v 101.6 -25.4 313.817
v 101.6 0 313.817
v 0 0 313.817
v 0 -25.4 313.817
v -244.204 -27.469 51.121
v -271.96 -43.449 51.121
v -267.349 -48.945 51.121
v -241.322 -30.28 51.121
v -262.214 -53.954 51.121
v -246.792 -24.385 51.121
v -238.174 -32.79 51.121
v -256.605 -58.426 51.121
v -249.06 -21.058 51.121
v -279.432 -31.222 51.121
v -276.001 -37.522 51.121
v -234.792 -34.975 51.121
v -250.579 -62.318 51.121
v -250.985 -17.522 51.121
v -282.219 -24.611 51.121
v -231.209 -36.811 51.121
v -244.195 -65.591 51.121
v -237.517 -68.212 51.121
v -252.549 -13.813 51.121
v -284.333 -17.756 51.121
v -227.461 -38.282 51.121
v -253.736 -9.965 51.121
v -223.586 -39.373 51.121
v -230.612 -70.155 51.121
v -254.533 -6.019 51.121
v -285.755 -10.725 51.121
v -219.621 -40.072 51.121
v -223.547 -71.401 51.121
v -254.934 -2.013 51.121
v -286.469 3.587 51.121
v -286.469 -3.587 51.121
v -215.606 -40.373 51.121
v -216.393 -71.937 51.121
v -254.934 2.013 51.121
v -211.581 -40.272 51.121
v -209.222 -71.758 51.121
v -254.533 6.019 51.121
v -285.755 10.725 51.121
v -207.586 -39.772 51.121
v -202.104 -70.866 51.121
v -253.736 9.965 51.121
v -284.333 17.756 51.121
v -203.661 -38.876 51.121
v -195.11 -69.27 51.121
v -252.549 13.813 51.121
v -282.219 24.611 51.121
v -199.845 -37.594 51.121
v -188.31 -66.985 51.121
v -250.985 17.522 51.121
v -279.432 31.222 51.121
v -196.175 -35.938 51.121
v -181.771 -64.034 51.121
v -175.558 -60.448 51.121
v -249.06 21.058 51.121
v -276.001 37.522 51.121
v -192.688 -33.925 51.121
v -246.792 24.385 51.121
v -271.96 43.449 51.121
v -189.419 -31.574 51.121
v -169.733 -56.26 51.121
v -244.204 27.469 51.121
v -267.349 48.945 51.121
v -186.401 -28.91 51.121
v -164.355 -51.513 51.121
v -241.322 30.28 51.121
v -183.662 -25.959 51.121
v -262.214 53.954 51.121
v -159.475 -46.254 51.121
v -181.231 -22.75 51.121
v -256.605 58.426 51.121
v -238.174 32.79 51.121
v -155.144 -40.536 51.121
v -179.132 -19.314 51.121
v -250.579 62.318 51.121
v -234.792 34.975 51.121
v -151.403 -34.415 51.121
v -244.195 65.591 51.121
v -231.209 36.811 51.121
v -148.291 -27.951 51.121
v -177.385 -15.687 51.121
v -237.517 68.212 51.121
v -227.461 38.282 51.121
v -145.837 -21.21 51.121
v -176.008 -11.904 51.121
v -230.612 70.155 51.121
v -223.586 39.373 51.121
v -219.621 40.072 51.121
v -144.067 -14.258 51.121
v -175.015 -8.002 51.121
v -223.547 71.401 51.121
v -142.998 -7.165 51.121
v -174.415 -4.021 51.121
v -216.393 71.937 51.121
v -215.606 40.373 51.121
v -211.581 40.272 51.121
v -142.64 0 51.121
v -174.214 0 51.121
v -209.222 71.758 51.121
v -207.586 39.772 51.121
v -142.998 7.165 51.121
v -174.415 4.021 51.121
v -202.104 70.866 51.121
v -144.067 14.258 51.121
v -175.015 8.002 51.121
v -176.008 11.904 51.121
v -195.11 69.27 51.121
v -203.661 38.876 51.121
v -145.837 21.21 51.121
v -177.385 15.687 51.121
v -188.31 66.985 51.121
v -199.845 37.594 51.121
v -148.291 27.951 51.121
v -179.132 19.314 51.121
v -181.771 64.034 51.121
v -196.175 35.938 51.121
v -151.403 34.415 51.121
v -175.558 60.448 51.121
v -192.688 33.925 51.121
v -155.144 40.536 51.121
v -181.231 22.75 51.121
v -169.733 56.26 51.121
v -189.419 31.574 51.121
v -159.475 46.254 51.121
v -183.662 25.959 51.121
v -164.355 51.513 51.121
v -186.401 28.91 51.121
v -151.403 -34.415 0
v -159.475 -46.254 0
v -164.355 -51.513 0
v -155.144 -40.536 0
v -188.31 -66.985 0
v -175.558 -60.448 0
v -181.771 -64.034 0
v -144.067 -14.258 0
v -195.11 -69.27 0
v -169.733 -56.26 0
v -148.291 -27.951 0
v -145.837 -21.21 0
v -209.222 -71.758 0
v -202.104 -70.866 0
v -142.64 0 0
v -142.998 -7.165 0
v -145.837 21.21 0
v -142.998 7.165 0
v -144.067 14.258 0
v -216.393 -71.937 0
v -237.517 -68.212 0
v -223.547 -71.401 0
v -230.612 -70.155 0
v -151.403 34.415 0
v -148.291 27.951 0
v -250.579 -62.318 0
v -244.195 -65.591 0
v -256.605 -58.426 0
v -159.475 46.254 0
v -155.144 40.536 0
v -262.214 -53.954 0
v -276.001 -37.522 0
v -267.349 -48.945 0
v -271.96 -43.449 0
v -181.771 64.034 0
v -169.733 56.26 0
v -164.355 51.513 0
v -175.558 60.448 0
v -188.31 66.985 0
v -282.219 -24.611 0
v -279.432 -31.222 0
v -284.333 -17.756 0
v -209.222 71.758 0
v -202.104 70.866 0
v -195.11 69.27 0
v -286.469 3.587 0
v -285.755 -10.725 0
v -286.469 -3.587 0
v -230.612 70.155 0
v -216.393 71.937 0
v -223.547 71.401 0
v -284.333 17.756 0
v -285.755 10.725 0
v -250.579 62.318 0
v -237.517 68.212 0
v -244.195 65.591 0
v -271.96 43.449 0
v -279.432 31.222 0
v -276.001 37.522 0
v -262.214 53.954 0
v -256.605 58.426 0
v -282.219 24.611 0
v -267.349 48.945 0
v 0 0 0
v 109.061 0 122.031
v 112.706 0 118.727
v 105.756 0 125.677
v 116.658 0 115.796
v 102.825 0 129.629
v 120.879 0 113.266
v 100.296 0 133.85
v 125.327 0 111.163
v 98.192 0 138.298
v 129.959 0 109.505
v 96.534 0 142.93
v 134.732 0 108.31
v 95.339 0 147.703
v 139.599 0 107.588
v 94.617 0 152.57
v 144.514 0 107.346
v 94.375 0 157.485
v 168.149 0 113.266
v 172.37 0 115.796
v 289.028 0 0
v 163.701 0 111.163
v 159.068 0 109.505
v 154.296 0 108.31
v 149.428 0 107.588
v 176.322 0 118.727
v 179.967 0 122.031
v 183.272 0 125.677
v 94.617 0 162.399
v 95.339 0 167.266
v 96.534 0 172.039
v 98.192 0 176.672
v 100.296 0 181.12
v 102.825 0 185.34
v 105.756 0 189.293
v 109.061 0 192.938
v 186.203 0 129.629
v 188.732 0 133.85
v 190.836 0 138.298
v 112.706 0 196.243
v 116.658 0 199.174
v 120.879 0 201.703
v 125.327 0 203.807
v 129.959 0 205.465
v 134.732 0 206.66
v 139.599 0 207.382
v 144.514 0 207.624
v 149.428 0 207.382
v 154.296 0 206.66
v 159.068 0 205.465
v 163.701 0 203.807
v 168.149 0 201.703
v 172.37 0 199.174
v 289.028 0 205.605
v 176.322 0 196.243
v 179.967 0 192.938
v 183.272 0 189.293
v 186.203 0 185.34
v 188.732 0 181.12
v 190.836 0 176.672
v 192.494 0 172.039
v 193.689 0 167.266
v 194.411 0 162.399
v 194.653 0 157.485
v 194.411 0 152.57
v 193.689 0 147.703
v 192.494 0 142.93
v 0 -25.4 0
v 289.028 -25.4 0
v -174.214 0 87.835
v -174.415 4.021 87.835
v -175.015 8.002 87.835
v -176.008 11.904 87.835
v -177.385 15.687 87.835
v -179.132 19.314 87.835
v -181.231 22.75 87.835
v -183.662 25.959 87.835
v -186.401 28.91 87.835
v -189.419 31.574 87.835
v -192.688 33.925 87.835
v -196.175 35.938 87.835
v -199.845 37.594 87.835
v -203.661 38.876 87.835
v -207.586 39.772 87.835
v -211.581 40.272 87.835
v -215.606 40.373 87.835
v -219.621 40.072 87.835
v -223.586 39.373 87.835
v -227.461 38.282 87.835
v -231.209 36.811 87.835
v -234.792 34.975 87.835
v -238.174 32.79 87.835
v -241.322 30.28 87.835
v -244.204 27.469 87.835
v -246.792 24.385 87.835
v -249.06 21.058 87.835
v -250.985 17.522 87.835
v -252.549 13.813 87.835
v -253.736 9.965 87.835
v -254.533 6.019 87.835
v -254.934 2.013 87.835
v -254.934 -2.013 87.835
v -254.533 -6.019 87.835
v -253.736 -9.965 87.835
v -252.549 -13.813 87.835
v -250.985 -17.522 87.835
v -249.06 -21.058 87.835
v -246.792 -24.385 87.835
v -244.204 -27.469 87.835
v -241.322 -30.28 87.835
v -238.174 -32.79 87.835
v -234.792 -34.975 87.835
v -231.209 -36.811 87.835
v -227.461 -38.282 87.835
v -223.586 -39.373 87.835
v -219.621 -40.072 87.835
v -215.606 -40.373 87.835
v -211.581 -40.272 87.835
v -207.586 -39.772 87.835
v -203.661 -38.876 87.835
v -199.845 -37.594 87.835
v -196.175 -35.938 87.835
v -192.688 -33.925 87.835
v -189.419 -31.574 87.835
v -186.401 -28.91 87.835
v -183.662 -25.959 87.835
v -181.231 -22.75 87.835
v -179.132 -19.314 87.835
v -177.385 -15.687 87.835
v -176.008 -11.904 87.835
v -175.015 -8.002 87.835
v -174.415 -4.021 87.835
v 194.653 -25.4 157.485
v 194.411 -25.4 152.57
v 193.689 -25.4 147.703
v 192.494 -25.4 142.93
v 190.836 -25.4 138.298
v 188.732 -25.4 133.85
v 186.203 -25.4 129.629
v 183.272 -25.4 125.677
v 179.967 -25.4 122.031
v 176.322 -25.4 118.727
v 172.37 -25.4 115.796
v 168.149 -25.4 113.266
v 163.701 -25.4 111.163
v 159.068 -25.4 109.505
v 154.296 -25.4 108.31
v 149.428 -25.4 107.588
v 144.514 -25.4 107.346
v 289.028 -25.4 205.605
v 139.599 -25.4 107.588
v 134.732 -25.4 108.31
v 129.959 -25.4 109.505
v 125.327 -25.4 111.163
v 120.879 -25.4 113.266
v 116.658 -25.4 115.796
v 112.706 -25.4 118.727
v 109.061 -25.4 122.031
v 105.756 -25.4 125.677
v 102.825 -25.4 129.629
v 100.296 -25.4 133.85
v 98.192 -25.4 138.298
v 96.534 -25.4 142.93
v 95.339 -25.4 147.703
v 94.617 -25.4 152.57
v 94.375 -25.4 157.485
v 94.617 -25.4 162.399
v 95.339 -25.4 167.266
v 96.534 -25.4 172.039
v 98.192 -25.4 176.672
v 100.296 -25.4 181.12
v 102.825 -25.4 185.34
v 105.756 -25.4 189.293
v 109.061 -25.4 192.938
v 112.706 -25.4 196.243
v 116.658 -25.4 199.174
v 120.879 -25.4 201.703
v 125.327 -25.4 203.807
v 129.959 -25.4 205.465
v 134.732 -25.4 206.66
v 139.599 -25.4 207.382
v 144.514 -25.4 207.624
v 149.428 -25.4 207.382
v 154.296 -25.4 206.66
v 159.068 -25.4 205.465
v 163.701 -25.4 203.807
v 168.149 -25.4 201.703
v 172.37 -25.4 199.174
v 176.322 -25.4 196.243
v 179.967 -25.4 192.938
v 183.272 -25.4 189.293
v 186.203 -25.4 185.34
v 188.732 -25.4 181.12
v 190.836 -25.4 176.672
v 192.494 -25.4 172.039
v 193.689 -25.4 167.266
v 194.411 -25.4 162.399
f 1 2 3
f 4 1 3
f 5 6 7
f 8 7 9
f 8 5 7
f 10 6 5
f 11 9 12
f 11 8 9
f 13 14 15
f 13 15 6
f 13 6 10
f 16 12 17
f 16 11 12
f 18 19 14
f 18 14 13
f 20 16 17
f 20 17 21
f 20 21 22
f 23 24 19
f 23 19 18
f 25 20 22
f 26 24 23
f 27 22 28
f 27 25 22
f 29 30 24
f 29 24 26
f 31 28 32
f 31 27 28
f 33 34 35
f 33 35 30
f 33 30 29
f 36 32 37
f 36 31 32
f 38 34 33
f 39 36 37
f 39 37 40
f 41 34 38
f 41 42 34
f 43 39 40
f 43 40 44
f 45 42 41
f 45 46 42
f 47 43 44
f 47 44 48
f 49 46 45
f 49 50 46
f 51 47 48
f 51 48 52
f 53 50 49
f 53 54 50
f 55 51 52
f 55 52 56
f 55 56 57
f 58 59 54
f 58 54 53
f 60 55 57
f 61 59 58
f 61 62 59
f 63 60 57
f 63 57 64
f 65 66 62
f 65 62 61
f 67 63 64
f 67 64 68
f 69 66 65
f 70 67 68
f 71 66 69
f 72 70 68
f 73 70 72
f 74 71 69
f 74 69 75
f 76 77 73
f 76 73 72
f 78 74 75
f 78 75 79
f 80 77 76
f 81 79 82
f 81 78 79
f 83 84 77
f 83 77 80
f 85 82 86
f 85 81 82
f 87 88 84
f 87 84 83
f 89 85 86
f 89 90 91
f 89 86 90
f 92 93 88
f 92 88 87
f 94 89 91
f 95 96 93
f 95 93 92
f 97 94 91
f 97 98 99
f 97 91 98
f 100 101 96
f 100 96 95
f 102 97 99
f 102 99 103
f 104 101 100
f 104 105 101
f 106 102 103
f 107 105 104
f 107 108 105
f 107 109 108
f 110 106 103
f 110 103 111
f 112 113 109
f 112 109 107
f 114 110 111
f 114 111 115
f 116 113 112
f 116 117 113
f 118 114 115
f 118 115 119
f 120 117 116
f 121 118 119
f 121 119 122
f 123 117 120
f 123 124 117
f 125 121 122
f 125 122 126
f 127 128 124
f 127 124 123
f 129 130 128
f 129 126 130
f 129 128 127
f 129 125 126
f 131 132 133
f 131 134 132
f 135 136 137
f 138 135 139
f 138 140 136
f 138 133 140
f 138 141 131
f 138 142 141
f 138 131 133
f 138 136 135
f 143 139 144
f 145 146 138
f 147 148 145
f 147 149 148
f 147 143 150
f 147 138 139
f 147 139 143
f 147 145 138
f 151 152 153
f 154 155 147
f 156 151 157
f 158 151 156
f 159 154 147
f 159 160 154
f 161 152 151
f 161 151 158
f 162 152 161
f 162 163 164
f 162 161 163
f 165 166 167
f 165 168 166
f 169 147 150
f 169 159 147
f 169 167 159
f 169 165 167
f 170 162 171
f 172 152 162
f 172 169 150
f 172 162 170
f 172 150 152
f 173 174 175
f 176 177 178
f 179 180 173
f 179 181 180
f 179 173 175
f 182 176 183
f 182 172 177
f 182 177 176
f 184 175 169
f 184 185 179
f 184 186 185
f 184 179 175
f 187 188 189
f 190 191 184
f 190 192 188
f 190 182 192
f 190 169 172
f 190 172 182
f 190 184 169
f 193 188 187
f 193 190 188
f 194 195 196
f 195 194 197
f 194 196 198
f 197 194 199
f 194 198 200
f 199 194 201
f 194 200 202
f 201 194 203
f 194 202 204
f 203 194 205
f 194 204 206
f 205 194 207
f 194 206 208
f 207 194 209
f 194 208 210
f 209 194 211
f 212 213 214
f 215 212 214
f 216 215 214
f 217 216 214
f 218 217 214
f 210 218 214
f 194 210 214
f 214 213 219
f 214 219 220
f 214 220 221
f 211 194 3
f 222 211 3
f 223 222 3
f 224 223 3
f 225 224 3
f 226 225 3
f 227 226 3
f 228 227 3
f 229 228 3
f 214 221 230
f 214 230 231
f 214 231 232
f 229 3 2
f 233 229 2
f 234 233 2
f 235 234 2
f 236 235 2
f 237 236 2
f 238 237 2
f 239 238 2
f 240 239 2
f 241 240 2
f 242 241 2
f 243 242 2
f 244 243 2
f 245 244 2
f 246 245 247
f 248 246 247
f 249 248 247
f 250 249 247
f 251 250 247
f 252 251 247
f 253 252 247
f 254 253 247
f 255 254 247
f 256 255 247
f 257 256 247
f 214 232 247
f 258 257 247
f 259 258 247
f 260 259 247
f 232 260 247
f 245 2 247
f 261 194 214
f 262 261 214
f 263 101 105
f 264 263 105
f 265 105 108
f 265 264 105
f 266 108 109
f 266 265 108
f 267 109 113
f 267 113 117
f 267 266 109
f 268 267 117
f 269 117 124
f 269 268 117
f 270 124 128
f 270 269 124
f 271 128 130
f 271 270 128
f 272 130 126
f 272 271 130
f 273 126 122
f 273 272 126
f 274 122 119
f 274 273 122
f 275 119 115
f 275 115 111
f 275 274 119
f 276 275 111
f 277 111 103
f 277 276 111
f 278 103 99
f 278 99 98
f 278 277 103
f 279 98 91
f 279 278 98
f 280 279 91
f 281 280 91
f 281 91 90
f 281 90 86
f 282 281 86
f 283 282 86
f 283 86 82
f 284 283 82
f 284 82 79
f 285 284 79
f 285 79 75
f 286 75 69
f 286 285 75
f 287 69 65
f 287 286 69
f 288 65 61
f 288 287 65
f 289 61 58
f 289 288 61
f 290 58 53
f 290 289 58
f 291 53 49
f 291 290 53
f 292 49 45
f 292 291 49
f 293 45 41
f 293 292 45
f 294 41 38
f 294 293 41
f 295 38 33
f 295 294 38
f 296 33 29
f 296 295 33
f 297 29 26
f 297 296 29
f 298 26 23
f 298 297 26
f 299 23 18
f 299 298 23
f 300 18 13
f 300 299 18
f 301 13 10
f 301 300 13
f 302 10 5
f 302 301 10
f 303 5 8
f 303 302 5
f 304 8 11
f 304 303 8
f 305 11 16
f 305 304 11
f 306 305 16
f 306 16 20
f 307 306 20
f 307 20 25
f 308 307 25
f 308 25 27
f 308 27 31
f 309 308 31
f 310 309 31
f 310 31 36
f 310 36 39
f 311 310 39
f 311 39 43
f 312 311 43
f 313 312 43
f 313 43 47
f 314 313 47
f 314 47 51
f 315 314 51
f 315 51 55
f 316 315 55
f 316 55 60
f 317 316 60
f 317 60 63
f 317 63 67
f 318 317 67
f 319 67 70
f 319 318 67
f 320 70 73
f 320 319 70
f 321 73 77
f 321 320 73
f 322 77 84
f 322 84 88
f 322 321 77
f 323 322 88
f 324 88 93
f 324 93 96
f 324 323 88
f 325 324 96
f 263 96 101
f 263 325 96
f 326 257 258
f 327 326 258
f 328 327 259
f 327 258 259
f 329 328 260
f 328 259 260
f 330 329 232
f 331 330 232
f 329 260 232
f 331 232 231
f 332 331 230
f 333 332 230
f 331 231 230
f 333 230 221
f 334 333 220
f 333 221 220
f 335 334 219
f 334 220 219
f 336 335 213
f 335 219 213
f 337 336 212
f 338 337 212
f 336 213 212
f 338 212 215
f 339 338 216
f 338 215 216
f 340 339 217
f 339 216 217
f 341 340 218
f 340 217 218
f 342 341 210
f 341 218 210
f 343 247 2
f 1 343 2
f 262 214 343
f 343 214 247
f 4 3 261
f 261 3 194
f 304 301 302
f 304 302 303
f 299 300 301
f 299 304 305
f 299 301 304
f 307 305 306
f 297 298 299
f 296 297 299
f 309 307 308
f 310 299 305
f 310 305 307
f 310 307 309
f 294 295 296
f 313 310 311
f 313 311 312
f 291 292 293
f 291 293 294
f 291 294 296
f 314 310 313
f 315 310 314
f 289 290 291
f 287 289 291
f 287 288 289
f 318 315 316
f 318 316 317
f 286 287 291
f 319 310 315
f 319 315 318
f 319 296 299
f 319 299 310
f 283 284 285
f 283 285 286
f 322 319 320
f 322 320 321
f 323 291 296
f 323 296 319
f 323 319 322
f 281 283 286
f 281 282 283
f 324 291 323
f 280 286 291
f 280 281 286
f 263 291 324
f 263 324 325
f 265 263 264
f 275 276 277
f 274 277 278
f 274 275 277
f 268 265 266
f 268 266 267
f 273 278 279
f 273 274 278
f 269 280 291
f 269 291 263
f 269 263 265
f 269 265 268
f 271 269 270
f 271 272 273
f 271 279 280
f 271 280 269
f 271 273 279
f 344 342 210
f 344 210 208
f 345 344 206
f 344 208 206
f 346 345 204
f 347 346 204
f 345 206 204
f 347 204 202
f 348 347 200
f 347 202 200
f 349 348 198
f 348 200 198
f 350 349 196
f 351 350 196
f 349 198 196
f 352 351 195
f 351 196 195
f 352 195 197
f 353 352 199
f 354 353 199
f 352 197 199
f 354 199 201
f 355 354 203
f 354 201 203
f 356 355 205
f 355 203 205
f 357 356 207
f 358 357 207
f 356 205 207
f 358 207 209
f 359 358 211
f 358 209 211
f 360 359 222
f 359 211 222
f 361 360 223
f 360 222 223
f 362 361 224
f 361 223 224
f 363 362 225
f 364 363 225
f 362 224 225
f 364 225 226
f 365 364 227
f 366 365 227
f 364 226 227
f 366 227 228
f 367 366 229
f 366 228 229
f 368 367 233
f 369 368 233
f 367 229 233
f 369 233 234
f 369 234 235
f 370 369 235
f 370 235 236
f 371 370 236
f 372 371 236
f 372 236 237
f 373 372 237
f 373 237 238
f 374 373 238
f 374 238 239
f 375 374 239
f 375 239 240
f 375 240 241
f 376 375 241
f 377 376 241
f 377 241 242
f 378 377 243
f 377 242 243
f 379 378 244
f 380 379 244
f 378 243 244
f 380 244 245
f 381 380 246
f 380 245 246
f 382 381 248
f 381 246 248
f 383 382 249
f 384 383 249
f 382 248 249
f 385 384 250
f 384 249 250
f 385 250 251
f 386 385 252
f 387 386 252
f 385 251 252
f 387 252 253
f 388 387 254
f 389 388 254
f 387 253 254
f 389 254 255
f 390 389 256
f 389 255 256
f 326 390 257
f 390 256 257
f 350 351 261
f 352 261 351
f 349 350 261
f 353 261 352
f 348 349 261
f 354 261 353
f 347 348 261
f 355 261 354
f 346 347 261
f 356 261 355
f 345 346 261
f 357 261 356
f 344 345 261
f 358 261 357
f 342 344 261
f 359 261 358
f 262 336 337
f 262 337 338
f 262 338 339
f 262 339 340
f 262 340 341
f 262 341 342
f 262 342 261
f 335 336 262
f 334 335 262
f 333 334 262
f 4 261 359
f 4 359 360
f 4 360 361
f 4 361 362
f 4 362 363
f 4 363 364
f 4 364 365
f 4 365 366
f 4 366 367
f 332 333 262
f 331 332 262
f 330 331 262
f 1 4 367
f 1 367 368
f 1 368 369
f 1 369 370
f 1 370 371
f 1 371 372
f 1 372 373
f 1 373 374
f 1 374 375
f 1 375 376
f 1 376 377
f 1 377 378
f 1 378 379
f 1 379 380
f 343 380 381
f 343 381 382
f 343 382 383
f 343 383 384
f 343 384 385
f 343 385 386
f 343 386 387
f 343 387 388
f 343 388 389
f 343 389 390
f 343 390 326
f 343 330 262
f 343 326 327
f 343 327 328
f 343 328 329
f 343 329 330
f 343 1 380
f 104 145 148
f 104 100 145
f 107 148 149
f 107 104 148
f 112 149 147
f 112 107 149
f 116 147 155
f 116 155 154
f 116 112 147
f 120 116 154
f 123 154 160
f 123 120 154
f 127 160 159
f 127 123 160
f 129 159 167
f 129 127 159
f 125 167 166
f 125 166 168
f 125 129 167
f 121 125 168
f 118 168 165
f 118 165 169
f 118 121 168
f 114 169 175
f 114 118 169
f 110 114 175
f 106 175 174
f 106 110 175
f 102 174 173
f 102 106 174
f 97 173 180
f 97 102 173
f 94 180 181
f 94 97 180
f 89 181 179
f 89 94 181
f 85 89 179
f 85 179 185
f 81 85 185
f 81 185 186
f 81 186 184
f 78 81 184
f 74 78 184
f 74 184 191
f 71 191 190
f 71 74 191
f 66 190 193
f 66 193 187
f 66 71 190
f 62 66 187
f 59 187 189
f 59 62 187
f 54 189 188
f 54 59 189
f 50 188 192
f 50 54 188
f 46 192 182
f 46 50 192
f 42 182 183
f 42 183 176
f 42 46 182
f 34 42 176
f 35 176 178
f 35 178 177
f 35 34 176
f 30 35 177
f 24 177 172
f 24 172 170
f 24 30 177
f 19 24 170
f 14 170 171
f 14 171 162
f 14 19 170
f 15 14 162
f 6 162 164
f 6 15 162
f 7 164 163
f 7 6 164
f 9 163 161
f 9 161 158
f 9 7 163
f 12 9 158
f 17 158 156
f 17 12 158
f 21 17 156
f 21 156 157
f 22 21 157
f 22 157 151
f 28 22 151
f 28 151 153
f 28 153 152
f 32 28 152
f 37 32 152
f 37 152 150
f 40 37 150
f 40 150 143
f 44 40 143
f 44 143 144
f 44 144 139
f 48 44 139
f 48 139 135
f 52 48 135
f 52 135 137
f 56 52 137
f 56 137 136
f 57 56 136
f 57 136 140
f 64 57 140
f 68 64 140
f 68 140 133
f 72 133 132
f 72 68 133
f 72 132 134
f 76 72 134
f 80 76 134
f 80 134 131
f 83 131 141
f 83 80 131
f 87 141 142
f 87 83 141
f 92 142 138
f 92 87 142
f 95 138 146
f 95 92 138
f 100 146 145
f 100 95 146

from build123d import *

# Parameters (mm, degrees)
F1_DEPTH = 25.4


with BuildPart() as f1:
    # F0 (on Front) → F1 (new body)
    with BuildSketch(Plane.XZ):
        with BuildLine():
            ThreePointArc((194.652651, 157.484895), (109.060513, 192.938319), (144.513937, 107.346182))
            ThreePointArc((144.513937, 107.346182), (179.967361, 122.031471), (194.652651, 157.484895))
        make_face()
        Polygon((0, 313.81694), (0, 0), (144.513937, 0), (289.027875, 0), (289.027875, 205.605406), (101.6, 313.81694), align=None)
        with BuildLine():
            ThreePointArc((194.652651, 157.484895), (179.967361, 122.031471), (144.513937, 107.346182))
            ThreePointArc((144.513937, 107.346182), (109.060513, 192.938319), (194.652651, 157.484895))
        make_face(mode=Mode.SUBTRACT)
    extrude(amount=F1_DEPTH)


with BuildPart() as f3:
    # F2 (on Front) → F3 (revolve)
    with BuildSketch(Plane.XZ):
        Polygon((-214.599207, 87.834574), (-214.599207, 0), (-142.640114, 0), (-142.640114, 51.120743), (-174.214005, 51.120743), (-174.214005, 87.834574), align=None)
    revolve(axis=Axis((-214.599207, 0, 43.917287), (0, 0, 1)))


solid = Compound([f1.part, f3.part])
